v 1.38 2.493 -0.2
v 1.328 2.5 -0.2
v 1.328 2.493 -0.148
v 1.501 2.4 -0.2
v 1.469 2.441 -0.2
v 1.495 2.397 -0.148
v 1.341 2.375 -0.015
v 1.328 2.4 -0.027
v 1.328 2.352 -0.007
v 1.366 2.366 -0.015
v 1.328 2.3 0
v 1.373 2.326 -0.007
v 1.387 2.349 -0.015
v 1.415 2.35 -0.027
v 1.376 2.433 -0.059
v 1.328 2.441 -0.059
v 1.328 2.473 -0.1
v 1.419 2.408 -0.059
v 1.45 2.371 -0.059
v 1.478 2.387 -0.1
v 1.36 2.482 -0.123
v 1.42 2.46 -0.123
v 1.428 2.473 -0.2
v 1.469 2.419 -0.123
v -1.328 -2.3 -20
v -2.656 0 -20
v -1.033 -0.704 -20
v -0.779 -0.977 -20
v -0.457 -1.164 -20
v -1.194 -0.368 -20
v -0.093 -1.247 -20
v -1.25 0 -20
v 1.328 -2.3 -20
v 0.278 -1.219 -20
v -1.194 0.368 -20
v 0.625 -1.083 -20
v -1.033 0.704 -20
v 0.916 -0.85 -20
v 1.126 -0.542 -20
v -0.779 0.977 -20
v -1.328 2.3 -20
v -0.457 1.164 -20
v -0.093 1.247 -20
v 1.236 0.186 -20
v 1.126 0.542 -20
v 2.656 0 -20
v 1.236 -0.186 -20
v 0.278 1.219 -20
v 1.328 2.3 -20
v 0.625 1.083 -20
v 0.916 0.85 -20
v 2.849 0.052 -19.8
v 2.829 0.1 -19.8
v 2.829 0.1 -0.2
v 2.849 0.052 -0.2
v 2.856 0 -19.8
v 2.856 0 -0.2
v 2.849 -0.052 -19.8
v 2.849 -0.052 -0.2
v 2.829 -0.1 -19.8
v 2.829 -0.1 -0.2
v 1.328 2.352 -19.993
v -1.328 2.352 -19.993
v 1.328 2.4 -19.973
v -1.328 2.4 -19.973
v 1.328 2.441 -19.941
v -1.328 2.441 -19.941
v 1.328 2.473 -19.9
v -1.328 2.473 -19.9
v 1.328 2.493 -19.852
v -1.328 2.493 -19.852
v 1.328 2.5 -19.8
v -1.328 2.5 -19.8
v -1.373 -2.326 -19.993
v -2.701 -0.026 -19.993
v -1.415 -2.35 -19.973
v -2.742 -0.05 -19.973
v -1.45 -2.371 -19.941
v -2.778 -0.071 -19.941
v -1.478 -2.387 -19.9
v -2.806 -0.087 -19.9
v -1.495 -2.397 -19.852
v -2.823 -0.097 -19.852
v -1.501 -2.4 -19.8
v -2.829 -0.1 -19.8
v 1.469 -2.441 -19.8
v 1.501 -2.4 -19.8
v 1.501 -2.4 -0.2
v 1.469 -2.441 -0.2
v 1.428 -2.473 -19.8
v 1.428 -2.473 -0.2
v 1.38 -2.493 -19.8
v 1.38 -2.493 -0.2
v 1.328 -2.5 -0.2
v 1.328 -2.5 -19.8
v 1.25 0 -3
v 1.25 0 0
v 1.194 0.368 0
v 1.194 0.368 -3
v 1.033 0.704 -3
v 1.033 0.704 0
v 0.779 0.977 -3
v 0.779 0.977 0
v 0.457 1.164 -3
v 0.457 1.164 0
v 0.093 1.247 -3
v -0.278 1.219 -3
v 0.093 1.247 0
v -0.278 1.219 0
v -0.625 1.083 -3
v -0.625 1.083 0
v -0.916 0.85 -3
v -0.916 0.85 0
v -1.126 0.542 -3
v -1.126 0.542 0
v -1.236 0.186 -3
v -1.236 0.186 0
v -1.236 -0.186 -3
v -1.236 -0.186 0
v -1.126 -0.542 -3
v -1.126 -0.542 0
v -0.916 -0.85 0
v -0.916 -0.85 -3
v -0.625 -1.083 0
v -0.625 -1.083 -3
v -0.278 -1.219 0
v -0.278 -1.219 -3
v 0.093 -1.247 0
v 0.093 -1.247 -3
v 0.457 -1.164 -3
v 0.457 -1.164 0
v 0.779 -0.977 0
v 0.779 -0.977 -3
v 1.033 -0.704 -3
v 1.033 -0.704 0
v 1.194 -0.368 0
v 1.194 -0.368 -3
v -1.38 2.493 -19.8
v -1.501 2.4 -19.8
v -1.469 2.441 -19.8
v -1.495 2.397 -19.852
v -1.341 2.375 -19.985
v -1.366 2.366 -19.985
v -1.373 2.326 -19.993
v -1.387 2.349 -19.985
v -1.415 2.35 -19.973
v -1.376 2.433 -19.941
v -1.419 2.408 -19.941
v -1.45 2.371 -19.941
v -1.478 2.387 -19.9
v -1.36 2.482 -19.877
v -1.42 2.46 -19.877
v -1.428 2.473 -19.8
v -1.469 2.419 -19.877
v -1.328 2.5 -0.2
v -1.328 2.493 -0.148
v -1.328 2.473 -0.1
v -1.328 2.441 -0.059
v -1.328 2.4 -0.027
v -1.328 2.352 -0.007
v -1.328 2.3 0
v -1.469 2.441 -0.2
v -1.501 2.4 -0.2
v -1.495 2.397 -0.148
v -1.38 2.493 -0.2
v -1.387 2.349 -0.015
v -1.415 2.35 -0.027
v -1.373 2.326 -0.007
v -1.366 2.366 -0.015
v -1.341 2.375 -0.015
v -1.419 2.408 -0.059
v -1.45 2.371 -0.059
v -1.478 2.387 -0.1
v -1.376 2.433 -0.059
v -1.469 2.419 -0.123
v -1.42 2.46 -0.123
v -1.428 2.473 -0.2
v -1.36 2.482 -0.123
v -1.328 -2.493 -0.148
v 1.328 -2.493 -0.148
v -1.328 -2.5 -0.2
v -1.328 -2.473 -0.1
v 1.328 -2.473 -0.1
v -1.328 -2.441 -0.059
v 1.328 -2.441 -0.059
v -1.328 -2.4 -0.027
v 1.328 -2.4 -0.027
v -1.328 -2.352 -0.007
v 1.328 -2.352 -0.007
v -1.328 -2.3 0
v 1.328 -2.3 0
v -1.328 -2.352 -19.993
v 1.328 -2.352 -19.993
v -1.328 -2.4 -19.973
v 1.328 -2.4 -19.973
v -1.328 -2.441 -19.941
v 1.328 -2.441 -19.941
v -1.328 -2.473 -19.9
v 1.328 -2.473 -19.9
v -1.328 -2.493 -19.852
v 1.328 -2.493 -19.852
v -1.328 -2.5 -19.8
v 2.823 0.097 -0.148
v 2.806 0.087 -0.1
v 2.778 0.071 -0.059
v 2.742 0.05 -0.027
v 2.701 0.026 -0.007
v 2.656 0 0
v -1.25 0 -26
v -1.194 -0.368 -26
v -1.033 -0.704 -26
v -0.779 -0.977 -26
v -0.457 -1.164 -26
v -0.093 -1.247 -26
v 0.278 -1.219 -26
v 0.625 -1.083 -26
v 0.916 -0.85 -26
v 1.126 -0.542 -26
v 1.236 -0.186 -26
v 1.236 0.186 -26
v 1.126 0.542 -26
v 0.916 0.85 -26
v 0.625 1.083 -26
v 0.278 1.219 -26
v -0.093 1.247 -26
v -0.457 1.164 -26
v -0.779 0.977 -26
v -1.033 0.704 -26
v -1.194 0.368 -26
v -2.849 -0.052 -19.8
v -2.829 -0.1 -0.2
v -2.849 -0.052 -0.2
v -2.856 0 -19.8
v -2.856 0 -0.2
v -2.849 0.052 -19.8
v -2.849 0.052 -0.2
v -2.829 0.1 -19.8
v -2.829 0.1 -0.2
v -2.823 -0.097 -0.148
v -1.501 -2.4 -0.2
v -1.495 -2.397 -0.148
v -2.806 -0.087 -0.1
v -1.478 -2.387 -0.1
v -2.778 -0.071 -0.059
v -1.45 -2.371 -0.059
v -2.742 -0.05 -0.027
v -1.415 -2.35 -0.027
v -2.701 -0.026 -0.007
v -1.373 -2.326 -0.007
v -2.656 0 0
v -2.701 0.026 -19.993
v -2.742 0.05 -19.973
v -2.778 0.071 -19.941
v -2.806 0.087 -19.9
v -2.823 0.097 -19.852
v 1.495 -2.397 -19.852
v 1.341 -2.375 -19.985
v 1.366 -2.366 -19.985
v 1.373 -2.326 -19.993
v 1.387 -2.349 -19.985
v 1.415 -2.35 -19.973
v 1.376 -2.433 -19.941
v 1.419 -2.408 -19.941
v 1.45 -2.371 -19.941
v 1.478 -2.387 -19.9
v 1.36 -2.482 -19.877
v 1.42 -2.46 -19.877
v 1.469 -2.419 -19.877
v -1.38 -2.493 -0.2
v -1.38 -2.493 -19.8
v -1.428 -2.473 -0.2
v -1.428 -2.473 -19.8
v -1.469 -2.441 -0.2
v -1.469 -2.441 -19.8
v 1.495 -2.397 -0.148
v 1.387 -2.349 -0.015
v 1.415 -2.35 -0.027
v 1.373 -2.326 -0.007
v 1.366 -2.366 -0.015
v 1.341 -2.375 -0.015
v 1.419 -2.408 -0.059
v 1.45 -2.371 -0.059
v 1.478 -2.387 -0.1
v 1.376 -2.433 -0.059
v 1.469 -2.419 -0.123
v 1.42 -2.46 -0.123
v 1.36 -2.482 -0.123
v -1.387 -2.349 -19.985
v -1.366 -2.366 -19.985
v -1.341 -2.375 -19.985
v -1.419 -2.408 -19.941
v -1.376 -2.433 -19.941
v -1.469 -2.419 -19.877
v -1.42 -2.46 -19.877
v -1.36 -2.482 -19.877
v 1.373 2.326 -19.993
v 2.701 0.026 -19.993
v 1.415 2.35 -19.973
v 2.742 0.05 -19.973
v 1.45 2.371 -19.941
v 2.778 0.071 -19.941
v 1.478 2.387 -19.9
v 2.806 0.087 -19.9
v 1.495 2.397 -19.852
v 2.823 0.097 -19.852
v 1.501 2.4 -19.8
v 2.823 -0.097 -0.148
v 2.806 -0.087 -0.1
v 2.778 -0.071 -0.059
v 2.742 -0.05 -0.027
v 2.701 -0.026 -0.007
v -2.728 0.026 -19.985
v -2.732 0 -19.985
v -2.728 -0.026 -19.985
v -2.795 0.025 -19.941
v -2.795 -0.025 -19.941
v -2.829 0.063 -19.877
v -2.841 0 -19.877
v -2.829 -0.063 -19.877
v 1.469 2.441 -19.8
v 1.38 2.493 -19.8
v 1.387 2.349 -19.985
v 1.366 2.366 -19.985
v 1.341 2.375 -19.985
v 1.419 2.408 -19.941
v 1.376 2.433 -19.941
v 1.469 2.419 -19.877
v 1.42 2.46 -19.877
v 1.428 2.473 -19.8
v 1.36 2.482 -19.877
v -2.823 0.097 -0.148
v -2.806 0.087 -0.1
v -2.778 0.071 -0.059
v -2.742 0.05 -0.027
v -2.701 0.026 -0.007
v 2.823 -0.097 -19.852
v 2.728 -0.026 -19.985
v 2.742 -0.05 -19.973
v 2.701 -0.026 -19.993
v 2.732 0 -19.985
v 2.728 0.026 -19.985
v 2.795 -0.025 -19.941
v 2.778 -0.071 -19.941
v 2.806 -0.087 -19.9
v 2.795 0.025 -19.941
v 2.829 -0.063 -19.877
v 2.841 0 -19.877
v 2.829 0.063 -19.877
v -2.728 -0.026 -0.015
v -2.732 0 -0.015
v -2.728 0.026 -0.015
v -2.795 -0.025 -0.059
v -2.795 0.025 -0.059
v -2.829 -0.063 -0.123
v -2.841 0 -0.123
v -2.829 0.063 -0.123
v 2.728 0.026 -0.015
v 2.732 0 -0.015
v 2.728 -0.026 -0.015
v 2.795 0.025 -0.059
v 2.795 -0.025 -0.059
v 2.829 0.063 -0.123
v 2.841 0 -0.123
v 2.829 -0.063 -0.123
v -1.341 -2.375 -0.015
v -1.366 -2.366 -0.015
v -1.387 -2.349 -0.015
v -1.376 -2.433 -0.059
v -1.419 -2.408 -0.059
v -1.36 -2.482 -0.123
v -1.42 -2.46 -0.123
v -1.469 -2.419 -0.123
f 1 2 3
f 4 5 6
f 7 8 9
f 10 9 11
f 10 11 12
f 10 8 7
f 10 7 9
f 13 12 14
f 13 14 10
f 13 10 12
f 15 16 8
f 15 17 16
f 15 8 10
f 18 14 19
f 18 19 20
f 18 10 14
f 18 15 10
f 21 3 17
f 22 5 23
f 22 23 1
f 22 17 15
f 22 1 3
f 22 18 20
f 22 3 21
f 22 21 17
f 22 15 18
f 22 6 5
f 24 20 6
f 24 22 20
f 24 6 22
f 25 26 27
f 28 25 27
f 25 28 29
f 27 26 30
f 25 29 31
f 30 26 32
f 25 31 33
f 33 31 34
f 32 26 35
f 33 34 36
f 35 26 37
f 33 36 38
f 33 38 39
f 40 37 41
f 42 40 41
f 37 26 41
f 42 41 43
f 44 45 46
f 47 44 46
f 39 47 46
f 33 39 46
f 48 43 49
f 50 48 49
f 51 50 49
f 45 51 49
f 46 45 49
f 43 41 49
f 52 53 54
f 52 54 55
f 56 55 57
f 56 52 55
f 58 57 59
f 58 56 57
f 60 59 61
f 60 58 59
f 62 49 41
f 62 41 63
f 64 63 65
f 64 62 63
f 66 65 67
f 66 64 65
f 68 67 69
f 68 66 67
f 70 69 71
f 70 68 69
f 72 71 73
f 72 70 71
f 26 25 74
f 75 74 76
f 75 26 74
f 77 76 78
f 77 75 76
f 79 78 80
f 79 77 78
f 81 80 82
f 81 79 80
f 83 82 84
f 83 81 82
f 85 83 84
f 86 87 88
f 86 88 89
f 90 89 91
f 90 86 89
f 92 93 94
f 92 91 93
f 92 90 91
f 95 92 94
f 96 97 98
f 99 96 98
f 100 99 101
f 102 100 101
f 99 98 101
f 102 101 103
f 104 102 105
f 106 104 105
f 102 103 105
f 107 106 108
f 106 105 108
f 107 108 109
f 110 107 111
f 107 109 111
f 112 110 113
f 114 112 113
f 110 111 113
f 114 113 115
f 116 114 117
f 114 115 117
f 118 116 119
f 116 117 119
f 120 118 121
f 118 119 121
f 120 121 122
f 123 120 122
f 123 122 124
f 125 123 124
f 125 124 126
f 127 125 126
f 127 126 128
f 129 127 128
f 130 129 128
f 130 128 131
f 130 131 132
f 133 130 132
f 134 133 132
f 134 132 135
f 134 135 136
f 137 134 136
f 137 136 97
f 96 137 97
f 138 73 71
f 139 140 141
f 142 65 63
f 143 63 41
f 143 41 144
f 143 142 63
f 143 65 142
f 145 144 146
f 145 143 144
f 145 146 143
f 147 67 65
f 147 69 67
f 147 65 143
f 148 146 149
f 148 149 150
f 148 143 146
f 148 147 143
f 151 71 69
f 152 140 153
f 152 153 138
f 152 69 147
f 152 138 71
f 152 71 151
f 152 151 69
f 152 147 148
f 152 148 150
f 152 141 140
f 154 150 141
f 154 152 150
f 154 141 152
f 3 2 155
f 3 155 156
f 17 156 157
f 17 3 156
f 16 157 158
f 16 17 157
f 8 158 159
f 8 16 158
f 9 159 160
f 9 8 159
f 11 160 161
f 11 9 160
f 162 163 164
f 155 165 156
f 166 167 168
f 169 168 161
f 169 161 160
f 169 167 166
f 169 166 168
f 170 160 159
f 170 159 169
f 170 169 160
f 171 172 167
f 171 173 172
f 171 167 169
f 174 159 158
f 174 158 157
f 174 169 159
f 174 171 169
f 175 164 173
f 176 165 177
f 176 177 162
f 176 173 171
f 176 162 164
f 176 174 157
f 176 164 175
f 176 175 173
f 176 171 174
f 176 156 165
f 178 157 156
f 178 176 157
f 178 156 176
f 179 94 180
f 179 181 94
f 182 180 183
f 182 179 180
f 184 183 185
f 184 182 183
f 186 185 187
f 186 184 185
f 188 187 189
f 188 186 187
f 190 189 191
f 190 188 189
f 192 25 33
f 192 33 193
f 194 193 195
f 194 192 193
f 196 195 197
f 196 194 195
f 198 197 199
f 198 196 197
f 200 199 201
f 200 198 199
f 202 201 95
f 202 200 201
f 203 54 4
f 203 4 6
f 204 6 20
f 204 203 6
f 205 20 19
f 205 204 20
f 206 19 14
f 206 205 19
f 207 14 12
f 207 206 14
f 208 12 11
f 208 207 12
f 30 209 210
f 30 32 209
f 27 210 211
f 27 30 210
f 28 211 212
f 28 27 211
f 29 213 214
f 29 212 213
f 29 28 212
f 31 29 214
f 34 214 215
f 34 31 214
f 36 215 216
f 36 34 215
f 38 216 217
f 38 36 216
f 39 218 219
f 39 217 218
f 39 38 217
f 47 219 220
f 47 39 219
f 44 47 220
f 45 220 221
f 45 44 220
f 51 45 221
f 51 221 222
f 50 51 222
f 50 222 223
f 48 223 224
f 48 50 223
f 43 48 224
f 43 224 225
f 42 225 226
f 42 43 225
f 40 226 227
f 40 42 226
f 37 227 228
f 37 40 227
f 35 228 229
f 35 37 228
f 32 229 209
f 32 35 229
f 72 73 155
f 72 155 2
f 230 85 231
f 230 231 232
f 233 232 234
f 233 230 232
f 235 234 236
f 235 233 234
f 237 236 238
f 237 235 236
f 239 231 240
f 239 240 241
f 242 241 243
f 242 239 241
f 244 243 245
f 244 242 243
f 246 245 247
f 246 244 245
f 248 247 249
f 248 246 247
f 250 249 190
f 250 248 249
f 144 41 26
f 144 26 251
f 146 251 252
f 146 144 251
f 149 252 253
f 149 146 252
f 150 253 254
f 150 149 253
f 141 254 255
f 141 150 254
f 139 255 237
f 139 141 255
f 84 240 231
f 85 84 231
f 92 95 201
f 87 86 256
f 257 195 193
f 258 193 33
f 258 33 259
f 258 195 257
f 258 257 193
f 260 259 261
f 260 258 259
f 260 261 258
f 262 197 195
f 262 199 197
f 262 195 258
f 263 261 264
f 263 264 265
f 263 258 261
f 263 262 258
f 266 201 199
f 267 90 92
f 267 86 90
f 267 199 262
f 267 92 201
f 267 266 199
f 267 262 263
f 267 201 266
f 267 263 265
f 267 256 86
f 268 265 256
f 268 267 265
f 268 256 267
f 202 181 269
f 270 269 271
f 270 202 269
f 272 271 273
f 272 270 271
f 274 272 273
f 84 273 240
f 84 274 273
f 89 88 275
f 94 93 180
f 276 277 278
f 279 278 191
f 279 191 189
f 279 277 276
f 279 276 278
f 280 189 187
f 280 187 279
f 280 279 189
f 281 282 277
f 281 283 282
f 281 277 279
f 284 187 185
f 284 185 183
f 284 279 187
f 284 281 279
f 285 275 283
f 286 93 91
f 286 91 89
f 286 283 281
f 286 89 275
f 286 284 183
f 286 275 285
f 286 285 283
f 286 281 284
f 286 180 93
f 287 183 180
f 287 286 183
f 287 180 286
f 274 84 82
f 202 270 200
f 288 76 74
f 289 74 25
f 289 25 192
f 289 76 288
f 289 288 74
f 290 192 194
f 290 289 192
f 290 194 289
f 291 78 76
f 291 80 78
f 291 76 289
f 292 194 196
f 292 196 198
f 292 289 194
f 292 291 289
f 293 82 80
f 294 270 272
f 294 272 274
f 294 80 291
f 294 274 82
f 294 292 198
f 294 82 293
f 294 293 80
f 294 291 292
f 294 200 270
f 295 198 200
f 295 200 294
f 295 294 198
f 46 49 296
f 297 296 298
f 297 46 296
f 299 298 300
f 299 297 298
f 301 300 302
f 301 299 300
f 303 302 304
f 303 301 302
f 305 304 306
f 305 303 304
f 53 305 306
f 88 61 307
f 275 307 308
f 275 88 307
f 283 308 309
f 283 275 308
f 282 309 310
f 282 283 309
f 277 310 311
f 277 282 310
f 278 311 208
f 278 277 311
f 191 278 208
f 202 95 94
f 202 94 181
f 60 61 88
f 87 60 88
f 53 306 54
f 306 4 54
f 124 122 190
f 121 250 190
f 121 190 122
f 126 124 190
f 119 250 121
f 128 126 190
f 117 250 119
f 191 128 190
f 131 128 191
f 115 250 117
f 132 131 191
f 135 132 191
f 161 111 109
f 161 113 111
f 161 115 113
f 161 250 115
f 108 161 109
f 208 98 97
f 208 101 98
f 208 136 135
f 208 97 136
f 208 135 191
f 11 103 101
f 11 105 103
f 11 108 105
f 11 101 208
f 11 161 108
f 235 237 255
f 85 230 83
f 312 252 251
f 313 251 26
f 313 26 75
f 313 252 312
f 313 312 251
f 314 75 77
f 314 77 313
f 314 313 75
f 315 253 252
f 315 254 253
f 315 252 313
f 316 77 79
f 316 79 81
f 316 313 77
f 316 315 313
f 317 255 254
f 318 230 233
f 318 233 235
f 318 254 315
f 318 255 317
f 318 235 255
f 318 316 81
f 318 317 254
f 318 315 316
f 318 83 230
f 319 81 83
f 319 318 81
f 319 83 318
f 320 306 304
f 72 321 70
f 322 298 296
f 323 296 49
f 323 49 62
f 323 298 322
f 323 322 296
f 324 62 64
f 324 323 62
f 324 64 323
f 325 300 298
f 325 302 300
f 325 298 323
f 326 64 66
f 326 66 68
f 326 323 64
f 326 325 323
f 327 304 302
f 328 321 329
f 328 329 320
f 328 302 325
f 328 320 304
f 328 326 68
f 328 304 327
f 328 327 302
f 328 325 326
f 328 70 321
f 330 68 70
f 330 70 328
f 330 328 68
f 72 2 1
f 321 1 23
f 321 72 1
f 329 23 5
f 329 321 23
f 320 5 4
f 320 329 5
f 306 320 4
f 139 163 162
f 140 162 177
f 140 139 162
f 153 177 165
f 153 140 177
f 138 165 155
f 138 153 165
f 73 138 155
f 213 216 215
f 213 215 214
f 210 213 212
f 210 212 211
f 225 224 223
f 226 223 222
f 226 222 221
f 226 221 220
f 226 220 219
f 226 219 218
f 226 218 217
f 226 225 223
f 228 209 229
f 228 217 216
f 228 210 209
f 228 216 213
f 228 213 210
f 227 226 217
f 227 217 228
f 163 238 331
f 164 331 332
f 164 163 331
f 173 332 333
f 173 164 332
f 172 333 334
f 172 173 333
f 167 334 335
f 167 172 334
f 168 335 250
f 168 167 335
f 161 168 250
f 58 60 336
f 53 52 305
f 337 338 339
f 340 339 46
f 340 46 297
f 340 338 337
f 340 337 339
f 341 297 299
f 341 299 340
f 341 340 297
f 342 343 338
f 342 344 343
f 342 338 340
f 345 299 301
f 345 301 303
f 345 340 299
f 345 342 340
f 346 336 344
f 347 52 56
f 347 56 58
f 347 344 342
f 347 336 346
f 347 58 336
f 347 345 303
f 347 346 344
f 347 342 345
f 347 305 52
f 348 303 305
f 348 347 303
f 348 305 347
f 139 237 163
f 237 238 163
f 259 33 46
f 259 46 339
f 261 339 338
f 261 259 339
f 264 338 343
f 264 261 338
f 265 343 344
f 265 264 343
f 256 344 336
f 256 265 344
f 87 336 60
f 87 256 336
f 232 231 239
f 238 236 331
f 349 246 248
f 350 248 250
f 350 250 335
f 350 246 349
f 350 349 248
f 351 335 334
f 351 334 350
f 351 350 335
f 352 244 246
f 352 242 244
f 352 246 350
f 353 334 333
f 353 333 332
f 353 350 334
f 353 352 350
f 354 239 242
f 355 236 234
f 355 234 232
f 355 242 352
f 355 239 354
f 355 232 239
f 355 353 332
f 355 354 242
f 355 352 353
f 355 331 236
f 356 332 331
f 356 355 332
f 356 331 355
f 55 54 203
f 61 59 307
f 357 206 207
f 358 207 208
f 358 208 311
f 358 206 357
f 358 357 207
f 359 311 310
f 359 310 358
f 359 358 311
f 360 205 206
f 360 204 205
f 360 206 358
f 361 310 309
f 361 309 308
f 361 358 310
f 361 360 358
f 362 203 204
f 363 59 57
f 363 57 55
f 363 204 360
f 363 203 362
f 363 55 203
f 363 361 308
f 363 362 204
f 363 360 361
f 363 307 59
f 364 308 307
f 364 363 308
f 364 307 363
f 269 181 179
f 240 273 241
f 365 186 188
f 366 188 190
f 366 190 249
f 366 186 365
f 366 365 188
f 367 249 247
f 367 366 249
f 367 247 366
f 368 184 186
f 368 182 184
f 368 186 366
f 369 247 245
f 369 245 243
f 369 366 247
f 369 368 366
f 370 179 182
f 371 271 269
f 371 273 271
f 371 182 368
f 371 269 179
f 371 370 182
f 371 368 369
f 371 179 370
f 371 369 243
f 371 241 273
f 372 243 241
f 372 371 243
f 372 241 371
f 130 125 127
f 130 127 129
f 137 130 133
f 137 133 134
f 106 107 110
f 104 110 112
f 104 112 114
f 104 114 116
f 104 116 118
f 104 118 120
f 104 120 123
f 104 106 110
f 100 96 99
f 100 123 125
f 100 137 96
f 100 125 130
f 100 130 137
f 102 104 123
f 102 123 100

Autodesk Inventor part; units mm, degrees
ref_plane "YZ Plane" through (0, 0, 0) normal (1, 0, 0) x (0, 1, 0)
ref_plane "XZ Plane" through (0, 0, 0) normal (0, 1, 0) x (-1, 0, 0)
ref_plane "XY Plane" through (0, 0, 0) normal (0, 0, 1) x (1, 0, 0)
sketch "Sketch1" plane through (0, 0, 0) normal (0, 0, 1) x (1, 0, 0)
  line L0 (1.4434, -2.5) -> (-1.4434, -2.5)
  line L1 (-1.4434, -2.5) -> (-2.8868, 0)
  line L2 (-2.8868, 0) -> (-1.4434, 2.5)
  line L3 (-1.4434, 2.5) -> (1.4434, 2.5)
  line L4 (1.4434, 2.5) -> (2.8868, 0)
  line L5 (2.8868, 0) -> (1.4434, -2.5)
  point P0 (0, 0)
  point P1 (0, 0)
  dimension "d0" = 5
extrude "Extrusion1" add sketch "Sketch1" against normal blind 20
sketch "Sketch2" plane through (0, 0, 0) normal (0, 0, 1) x (1, 0, 0)
  circle A0 centre (0, 0) radius 1.25
  dimension "d3" = 2.5
extrude "Extrusion2" cut sketch "Sketch2" against normal blind 3
sketch "Sketch3" plane through (0, 0, -20) normal (0, 0, -1) x (-1, 0, 0)
  circle A0 centre (0, 0) radius 1.25
  dimension "d6" = 2.5
extrude "Extrusion3" add sketch "Sketch3" along normal blind 6
thread "Thread1" size "M2.5x0.45" class "6g" standard "ISO Metric profile" full length
thread "Thread2" size "M2.5x0.45" class "6H" standard "ISO Metric profile" full length
fillet "Fillet1" radius 0.2 12 edges at (0, -2.5, -20) (-2.1651, -1.25, -20) (-2.1651, 1.25, -20) (0, 2.5, -20) (2.1651, 1.25, -20) (2.1651, -1.25, -20) (0, -2.5, 0) (2.1651, -1.25, 0) (2.1651, 1.25, 0) (0, 2.5, 0) (-2.1651, 1.25, 0) (-2.1651, -1.25, 0)
fillet "Fillet1" radius 0.2 6 edges at (-2.8868, 0, -10) (-1.4434, 2.5, -10) (1.4434, 2.5, -10) (2.8868, 0, -10) (1.4434, -2.5, -10) (-1.4434, -2.5, -10)
sketch "Sketch4" plane through (0, 0, 0) normal (0, 0, 1) x (1, 0, 0)
  point P0 (0, 0)
equation "\"d0\" = m3hs_hexDiam"
equation "\"d3\" = m3hs_threadDiam"
equation "\"d4\" = m3hs_holeDepth"
equation "\"d6\" = m3hs_threadDiam"
equation "\"d7\" = m3hs_studLength"
equation "\"d13\" = m3hs_rounding"
equation "\"m3hs_hexDiam\" = 5"
equation "\"m3hs_bodyLength\" = 5"
equation "\"m3hs_holeDepth\" = 3"
equation "\"m3hs_studLength\" = 6"
equation "\"m3hs_rounding\" = 0.2"
equation "\"m3hs_threadDiam\" = 2.5"
properties part number "M2.5 Hex Spacer 5mm" material "Stainless Steel"
